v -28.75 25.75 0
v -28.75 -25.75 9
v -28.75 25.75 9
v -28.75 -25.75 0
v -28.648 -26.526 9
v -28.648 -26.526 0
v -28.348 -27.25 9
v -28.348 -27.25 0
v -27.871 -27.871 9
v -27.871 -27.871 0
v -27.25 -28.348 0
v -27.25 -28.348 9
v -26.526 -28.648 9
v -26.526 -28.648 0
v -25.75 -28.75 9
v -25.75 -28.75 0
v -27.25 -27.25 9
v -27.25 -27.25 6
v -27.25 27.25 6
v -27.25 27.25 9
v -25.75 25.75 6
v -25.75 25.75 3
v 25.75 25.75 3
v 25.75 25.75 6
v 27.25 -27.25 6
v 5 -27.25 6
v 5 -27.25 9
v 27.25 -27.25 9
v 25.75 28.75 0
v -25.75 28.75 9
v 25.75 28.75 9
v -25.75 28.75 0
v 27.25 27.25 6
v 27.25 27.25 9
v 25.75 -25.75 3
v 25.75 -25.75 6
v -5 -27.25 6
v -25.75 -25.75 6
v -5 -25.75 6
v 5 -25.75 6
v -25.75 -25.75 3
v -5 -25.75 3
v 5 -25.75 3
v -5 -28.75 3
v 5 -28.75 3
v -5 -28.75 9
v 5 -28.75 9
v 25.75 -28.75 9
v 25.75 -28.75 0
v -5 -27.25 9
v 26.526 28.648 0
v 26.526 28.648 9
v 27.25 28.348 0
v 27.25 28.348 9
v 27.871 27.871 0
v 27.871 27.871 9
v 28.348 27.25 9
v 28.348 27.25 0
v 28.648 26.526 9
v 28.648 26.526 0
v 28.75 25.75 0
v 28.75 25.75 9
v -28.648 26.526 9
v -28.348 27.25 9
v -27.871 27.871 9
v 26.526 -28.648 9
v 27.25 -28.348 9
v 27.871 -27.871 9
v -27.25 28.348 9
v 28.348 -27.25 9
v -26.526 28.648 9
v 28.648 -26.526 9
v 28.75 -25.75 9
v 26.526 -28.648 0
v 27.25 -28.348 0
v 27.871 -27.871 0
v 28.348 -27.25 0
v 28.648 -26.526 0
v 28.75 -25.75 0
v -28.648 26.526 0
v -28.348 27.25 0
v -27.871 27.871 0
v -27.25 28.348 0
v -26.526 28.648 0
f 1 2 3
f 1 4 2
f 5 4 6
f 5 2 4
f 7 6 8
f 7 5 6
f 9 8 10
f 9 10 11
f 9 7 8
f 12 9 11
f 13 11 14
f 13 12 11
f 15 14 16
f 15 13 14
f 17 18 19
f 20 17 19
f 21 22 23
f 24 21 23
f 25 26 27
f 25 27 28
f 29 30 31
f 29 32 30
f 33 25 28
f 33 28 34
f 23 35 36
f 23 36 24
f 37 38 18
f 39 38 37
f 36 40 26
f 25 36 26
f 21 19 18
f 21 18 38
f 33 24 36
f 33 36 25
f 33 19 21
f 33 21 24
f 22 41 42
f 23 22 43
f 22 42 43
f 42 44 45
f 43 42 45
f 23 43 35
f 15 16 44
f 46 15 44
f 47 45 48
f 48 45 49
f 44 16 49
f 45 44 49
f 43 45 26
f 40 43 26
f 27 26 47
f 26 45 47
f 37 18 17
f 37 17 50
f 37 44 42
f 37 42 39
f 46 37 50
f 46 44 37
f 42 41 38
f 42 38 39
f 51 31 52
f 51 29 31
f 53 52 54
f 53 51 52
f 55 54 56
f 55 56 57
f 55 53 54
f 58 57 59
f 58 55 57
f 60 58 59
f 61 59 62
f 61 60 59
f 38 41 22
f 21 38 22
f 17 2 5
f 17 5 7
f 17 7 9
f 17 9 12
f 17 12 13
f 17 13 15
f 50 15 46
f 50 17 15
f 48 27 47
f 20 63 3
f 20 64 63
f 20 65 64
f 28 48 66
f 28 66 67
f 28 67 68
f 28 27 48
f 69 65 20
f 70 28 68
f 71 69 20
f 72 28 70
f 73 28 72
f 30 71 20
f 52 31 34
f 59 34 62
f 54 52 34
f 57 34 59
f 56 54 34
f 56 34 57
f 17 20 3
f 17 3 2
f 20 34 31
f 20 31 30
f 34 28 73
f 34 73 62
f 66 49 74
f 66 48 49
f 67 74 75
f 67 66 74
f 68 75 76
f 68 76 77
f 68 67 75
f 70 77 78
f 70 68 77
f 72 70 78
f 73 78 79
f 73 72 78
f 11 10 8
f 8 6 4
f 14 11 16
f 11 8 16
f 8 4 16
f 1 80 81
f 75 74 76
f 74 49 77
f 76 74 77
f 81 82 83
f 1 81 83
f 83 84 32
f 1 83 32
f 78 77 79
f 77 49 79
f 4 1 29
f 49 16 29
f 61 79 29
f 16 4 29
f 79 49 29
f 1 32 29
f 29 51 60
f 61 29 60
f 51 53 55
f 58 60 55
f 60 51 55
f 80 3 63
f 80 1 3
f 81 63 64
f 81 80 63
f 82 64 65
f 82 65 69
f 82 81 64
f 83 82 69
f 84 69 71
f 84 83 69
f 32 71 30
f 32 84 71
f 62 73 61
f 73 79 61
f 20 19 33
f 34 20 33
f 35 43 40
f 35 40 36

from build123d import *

# Parameters (mm, degrees)
SKETCH_W      = 57.5
SKETCH_H      = 57.5
PAD_DEPTH     = 3
SKETCH001_W   = 57.5
SKETCH001_H   = 57.5
SKETCH001_W_2 = 51.5
SKETCH001_H_2 = 51.5
PAD001_DEPTH  = 3
SKETCH002_W   = 57.5
SKETCH002_H   = 57.5
SKETCH002_W_2 = 54.5
SKETCH002_H_2 = 54.5
PAD002_DEPTH  = 3
SKETCH003_W   = 10
SKETCH003_H   = 6
POCKET_DEPTH  = 5
FILLET_R      = 3


with BuildPart() as part:
    # Sketch → Pad (new body)
    with BuildSketch(Plane.XY):
        Rectangle(SKETCH_W, SKETCH_H)
    extrude(amount=PAD_DEPTH)

    # Sketch001 (on Face6 of Pad) → Pad001 (join)
    with BuildSketch(Plane.XY.offset(3)):
        Rectangle(SKETCH001_W, SKETCH001_H)
        Rectangle(SKETCH001_W_2, SKETCH001_H_2, mode=Mode.SUBTRACT)
    extrude(amount=PAD001_DEPTH)

    # Sketch002 (on Face9 of Pad001) → Pad002 (join)
    with BuildSketch(Plane.XY.offset(6)):
        Rectangle(SKETCH002_W, SKETCH002_H)
        Rectangle(SKETCH002_W_2, SKETCH002_H_2, mode=Mode.SUBTRACT)
    extrude(amount=PAD002_DEPTH)

    # Sketch003 (on Face10 of Pad002) → Pocket (cut)
    with BuildSketch(Plane.XZ.offset(28.75)):
        with Locations((0, 6)):
            Rectangle(SKETCH003_W, SKETCH003_H)
    extrude(amount=-POCKET_DEPTH, mode=Mode.SUBTRACT)

    # Fillet
    fillet_edges = [part.edges().sort_by_distance(p)[0] for p in [
        (-28.75, -28.75, 7.5),
        (-28.75, -28.75, 4.5),
        (-28.75, -28.75, 1.5),
        (-28.75, 28.75, 7.5),
        (-28.75, 28.75, 4.5),
        (-28.75, 28.75, 1.5),
        (28.75, -28.75, 7.5),
        (28.75, -28.75, 4.5),
        (28.75, -28.75, 1.5),
        (28.75, 28.75, 1.5),
        (28.75, 28.75, 4.5),
        (28.75, 28.75, 7.5),
    ]]
    fillet(fillet_edges, radius=FILLET_R)


solid = part.part
